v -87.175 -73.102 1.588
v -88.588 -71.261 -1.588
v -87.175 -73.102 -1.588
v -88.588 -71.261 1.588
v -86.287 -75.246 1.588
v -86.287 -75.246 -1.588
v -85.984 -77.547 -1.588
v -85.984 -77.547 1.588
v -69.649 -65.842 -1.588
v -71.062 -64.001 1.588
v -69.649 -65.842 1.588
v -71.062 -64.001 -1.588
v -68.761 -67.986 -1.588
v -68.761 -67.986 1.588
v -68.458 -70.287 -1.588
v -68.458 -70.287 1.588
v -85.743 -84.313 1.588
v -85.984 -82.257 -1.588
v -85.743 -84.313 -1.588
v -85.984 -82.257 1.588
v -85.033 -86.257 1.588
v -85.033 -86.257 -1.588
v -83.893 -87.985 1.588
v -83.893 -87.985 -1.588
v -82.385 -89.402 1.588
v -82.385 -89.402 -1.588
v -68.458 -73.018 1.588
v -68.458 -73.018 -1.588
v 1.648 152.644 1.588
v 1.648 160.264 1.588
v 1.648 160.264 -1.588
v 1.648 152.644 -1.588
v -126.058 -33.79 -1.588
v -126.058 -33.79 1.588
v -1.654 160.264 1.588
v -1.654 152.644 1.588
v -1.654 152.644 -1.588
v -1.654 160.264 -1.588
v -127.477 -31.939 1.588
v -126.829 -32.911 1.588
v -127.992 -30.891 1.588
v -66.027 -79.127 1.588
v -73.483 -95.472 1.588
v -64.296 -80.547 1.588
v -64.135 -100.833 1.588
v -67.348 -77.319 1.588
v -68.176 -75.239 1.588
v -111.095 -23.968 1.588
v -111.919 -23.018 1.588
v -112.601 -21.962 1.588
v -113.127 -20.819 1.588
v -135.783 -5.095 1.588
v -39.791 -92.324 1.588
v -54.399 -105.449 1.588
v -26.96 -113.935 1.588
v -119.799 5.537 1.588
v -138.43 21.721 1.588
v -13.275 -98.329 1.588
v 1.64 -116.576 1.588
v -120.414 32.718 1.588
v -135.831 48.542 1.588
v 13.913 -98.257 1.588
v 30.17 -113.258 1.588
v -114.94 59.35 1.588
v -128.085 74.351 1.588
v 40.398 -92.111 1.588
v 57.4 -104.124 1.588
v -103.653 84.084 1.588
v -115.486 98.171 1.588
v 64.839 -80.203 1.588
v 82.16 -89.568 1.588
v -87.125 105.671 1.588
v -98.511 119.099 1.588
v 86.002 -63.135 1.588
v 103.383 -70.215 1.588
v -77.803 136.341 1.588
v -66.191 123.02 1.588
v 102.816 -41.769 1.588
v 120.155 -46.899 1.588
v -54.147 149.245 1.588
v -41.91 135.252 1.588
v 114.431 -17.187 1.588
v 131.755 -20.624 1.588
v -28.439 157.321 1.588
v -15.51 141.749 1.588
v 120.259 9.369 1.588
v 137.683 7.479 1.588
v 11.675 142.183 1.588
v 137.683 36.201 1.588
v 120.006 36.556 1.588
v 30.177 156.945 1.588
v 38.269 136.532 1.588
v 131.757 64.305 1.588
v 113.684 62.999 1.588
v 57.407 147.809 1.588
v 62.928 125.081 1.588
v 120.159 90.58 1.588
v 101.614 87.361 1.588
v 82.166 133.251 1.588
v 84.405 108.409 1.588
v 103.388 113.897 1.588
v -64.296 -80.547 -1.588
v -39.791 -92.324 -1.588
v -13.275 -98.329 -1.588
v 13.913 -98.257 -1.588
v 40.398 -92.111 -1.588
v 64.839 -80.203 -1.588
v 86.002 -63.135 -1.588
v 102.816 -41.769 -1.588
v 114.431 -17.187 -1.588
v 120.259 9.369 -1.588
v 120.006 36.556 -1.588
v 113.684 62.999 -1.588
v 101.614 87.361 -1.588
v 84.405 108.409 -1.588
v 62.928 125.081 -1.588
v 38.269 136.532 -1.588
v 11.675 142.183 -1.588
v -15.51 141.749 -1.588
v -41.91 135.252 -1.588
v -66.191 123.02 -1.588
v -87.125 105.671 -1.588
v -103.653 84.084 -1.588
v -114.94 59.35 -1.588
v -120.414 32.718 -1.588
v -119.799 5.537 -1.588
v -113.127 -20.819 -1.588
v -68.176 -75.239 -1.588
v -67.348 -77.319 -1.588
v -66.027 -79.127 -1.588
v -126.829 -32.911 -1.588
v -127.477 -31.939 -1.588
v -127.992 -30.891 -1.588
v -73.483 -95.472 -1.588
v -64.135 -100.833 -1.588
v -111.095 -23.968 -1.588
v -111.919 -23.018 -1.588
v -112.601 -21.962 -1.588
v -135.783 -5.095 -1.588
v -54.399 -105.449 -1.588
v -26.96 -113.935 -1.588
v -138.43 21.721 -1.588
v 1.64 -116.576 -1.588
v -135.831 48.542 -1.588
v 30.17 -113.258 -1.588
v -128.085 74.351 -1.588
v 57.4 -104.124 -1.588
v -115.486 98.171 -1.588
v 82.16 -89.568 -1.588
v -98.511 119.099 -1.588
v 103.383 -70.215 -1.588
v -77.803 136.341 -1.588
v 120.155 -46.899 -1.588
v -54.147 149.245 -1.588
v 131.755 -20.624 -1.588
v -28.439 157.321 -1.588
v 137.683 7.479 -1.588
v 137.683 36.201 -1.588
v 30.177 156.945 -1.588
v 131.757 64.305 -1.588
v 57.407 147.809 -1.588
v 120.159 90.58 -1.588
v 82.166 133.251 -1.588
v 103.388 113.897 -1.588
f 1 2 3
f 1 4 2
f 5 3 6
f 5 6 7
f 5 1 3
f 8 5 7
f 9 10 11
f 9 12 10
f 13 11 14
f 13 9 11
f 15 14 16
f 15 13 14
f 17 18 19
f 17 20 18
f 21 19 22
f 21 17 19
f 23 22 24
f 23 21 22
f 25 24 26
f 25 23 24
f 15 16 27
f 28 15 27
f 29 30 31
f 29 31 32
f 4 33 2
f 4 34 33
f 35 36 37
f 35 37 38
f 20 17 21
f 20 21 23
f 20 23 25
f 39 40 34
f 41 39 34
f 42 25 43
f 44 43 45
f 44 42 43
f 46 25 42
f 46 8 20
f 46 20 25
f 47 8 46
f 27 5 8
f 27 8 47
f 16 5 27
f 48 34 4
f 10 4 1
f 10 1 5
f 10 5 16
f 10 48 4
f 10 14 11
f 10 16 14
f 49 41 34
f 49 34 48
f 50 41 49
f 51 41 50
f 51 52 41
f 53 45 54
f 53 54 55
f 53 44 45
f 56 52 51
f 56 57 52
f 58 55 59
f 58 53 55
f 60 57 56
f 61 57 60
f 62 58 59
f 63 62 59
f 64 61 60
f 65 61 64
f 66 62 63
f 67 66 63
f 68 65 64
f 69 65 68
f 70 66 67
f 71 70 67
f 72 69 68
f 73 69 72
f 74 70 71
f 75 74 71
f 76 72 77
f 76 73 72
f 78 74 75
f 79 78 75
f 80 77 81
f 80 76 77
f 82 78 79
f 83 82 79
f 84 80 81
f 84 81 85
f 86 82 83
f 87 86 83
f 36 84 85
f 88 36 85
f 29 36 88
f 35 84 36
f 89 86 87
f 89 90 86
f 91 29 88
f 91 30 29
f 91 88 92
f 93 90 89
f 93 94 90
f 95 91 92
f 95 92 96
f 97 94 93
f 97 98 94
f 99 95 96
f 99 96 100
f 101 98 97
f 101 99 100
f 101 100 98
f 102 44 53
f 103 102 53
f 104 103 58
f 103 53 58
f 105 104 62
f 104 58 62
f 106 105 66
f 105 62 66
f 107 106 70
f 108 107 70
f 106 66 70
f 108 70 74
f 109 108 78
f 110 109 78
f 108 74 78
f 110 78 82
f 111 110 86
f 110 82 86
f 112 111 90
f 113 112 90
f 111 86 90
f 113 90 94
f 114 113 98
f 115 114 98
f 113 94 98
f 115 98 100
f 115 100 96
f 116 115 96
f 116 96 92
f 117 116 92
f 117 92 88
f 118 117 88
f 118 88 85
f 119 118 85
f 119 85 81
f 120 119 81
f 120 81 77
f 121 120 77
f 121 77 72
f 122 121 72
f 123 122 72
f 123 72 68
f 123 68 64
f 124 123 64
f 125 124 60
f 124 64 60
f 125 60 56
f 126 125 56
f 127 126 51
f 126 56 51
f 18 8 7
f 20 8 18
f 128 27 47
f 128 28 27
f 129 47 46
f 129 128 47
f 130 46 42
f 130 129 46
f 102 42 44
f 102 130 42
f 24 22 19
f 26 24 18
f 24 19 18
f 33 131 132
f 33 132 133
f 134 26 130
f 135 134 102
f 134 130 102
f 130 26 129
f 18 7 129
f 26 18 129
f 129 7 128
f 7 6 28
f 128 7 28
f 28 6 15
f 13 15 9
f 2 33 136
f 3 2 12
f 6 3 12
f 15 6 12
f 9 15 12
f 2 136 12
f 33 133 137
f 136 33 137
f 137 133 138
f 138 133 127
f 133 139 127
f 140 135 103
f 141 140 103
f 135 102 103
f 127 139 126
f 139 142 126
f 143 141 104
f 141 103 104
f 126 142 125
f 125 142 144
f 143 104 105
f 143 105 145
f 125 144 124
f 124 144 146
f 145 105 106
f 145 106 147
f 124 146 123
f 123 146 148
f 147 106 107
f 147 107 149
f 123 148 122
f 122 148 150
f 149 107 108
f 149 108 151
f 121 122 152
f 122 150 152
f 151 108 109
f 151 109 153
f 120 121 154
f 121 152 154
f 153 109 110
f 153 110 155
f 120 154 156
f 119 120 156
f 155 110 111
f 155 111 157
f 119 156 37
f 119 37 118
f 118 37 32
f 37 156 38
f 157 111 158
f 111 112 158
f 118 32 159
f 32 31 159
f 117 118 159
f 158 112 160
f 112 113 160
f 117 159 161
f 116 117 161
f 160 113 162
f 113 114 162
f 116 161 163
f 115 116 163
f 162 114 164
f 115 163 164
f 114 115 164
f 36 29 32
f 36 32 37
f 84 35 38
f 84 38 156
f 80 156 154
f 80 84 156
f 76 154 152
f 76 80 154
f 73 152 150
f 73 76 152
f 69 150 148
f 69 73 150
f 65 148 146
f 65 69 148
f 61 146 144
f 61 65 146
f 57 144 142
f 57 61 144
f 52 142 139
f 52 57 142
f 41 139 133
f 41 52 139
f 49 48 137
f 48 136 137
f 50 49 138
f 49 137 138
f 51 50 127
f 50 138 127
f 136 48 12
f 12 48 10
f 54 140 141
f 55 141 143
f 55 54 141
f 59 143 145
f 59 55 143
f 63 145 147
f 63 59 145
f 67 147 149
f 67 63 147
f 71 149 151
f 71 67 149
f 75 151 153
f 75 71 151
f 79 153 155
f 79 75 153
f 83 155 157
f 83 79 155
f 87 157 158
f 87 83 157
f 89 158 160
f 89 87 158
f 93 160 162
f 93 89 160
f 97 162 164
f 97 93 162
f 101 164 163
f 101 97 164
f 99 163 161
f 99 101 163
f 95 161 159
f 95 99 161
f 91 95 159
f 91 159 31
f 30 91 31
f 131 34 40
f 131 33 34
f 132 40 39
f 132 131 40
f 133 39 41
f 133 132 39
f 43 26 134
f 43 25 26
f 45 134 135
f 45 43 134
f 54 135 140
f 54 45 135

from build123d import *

# Parameters (mm, degrees)
BOSS_EXTRUDE1_DEPTH = 1.5875
CUT_EXTRUDE1_DEPTH  = 3.175
FILLET1_R           = 8.89
CUT_EXTRUDE2_DEPTH  = 212.803448039


with BuildPart() as part:
    # Sketch1 → Boss-Extrude1 (new, symmetric)
    with BuildSketch(Plane.XY):
        with BuildLine():
            Line((-127.293308919, -32.555250036), (-85.984130762, -73.864428193))
            Line((-85.984130762, -73.864428193), (-85.984130762, -86.643760402))
            ThreePointArc((-85.984130762, -86.643760402), (-70.818680903, -97.099597285), (-54.399250036, -105.449308919))
            ThreePointArc((-54.399250036, -105.449308919), (97.88479172, 119.72879172), (-127.293308919, -32.555250036))
        make_face()
    extrude(amount=BOSS_EXTRUDE1_DEPTH, both=True)

    # Sketch2 → Cut-Extrude1 (cut)
    with BuildSketch(Plane.XY.offset(1.5875)):
        with BuildLine():
            Line((-112.423113331, -22.63993873), (-68.458130762, -66.604921299))
            Line((-68.458130762, -66.604921299), (-68.458130762, -77.811715082))
            ThreePointArc((-68.458130762, -77.811715082), (94.55415032, 97.191792757), (-112.423113331, -22.63993873))
        make_face()
    extrude(amount=-CUT_EXTRUDE1_DEPTH, mode=Mode.SUBTRACT)

    # Fillet1
    fillet1_edges = [part.edges().sort_by_distance(p)[0] for p in [
        (-112.423113331, -22.63993873, 0),
        (-68.458130762, -77.811715082, 0),
        (-68.458130762, -66.604921299, 0),
        (-85.984130762, -86.643760402, -0.79375),
        (-85.984130762, -73.864428193, -0.79375),
        (-127.293308919, -32.555250036, -0.79375),
    ]]
    fillet(fillet1_edges, radius=FILLET1_R)

    # Sketch3 → Cut-Extrude2 (cut, through all)
    with BuildSketch(Plane.XY.offset(1.5875)):
        with BuildLine():
            Line((-1.653853322, 152.644117868), (-1.654046603, 160.264117865))
            ThreePointArc((-1.654046603, 160.264117865), (-0.003046821, 160.273999966), (1.647953396, 160.264201621))
            Line((1.647953396, 160.264201621), (1.648146677, 152.644201623))
            Line((1.648146677, 152.644201623), (-1.653853322, 152.644117868))
        make_face()
    extrude(amount=-CUT_EXTRUDE2_DEPTH, mode=Mode.SUBTRACT)


with BuildPart() as cut_extrude2_kept_piece:
    # of the separate pieces the step leaves, the one the design keeps (cut_extrude2_pieces_kept)
    add(part.part.solids().sort_by_distance((-126.058425896, -33.790133059, -1.5875))[0])


solid = cut_extrude2_kept_piece.part
